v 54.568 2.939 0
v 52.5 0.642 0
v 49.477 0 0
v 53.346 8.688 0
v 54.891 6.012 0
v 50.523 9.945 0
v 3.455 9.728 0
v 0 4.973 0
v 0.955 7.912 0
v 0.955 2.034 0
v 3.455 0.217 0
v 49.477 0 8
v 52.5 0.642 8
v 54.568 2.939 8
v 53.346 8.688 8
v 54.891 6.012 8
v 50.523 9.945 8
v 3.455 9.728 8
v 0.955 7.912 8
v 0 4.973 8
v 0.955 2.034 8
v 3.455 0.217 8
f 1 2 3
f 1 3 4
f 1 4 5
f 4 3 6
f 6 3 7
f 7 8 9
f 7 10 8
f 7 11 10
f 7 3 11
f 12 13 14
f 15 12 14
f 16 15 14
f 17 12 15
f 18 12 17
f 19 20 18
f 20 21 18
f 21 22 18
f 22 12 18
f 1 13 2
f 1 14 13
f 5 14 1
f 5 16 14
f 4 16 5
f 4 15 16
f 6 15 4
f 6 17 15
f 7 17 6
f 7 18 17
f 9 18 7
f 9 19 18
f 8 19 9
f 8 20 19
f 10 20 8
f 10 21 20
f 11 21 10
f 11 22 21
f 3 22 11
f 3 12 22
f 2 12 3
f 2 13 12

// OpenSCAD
$fn = 32;

// ----------------------------------------------------------------------
// Lever arm: two bosses 10 and 10 mm, 45 mm between centres
// ----------------------------------------------------------------------

// --- parameters (mm) ---
profile_height = 8;       // extrusion height
profile_points = 11;      // points of the closed outline

profile = [[0, 4.973], [0.955, 2.034], [3.455, 0.217], [49.477, 0], [52.5, 0.642], [54.568, 2.939], [54.891, 6.012], [53.346, 8.688], [50.523, 9.945], [3.455, 9.728], [0.955, 7.912]];  // single closed polygon, 11 points, counter clockwise

// --- the one profile operation ---
linear_extrude(height = profile_height) polygon(points = profile);
